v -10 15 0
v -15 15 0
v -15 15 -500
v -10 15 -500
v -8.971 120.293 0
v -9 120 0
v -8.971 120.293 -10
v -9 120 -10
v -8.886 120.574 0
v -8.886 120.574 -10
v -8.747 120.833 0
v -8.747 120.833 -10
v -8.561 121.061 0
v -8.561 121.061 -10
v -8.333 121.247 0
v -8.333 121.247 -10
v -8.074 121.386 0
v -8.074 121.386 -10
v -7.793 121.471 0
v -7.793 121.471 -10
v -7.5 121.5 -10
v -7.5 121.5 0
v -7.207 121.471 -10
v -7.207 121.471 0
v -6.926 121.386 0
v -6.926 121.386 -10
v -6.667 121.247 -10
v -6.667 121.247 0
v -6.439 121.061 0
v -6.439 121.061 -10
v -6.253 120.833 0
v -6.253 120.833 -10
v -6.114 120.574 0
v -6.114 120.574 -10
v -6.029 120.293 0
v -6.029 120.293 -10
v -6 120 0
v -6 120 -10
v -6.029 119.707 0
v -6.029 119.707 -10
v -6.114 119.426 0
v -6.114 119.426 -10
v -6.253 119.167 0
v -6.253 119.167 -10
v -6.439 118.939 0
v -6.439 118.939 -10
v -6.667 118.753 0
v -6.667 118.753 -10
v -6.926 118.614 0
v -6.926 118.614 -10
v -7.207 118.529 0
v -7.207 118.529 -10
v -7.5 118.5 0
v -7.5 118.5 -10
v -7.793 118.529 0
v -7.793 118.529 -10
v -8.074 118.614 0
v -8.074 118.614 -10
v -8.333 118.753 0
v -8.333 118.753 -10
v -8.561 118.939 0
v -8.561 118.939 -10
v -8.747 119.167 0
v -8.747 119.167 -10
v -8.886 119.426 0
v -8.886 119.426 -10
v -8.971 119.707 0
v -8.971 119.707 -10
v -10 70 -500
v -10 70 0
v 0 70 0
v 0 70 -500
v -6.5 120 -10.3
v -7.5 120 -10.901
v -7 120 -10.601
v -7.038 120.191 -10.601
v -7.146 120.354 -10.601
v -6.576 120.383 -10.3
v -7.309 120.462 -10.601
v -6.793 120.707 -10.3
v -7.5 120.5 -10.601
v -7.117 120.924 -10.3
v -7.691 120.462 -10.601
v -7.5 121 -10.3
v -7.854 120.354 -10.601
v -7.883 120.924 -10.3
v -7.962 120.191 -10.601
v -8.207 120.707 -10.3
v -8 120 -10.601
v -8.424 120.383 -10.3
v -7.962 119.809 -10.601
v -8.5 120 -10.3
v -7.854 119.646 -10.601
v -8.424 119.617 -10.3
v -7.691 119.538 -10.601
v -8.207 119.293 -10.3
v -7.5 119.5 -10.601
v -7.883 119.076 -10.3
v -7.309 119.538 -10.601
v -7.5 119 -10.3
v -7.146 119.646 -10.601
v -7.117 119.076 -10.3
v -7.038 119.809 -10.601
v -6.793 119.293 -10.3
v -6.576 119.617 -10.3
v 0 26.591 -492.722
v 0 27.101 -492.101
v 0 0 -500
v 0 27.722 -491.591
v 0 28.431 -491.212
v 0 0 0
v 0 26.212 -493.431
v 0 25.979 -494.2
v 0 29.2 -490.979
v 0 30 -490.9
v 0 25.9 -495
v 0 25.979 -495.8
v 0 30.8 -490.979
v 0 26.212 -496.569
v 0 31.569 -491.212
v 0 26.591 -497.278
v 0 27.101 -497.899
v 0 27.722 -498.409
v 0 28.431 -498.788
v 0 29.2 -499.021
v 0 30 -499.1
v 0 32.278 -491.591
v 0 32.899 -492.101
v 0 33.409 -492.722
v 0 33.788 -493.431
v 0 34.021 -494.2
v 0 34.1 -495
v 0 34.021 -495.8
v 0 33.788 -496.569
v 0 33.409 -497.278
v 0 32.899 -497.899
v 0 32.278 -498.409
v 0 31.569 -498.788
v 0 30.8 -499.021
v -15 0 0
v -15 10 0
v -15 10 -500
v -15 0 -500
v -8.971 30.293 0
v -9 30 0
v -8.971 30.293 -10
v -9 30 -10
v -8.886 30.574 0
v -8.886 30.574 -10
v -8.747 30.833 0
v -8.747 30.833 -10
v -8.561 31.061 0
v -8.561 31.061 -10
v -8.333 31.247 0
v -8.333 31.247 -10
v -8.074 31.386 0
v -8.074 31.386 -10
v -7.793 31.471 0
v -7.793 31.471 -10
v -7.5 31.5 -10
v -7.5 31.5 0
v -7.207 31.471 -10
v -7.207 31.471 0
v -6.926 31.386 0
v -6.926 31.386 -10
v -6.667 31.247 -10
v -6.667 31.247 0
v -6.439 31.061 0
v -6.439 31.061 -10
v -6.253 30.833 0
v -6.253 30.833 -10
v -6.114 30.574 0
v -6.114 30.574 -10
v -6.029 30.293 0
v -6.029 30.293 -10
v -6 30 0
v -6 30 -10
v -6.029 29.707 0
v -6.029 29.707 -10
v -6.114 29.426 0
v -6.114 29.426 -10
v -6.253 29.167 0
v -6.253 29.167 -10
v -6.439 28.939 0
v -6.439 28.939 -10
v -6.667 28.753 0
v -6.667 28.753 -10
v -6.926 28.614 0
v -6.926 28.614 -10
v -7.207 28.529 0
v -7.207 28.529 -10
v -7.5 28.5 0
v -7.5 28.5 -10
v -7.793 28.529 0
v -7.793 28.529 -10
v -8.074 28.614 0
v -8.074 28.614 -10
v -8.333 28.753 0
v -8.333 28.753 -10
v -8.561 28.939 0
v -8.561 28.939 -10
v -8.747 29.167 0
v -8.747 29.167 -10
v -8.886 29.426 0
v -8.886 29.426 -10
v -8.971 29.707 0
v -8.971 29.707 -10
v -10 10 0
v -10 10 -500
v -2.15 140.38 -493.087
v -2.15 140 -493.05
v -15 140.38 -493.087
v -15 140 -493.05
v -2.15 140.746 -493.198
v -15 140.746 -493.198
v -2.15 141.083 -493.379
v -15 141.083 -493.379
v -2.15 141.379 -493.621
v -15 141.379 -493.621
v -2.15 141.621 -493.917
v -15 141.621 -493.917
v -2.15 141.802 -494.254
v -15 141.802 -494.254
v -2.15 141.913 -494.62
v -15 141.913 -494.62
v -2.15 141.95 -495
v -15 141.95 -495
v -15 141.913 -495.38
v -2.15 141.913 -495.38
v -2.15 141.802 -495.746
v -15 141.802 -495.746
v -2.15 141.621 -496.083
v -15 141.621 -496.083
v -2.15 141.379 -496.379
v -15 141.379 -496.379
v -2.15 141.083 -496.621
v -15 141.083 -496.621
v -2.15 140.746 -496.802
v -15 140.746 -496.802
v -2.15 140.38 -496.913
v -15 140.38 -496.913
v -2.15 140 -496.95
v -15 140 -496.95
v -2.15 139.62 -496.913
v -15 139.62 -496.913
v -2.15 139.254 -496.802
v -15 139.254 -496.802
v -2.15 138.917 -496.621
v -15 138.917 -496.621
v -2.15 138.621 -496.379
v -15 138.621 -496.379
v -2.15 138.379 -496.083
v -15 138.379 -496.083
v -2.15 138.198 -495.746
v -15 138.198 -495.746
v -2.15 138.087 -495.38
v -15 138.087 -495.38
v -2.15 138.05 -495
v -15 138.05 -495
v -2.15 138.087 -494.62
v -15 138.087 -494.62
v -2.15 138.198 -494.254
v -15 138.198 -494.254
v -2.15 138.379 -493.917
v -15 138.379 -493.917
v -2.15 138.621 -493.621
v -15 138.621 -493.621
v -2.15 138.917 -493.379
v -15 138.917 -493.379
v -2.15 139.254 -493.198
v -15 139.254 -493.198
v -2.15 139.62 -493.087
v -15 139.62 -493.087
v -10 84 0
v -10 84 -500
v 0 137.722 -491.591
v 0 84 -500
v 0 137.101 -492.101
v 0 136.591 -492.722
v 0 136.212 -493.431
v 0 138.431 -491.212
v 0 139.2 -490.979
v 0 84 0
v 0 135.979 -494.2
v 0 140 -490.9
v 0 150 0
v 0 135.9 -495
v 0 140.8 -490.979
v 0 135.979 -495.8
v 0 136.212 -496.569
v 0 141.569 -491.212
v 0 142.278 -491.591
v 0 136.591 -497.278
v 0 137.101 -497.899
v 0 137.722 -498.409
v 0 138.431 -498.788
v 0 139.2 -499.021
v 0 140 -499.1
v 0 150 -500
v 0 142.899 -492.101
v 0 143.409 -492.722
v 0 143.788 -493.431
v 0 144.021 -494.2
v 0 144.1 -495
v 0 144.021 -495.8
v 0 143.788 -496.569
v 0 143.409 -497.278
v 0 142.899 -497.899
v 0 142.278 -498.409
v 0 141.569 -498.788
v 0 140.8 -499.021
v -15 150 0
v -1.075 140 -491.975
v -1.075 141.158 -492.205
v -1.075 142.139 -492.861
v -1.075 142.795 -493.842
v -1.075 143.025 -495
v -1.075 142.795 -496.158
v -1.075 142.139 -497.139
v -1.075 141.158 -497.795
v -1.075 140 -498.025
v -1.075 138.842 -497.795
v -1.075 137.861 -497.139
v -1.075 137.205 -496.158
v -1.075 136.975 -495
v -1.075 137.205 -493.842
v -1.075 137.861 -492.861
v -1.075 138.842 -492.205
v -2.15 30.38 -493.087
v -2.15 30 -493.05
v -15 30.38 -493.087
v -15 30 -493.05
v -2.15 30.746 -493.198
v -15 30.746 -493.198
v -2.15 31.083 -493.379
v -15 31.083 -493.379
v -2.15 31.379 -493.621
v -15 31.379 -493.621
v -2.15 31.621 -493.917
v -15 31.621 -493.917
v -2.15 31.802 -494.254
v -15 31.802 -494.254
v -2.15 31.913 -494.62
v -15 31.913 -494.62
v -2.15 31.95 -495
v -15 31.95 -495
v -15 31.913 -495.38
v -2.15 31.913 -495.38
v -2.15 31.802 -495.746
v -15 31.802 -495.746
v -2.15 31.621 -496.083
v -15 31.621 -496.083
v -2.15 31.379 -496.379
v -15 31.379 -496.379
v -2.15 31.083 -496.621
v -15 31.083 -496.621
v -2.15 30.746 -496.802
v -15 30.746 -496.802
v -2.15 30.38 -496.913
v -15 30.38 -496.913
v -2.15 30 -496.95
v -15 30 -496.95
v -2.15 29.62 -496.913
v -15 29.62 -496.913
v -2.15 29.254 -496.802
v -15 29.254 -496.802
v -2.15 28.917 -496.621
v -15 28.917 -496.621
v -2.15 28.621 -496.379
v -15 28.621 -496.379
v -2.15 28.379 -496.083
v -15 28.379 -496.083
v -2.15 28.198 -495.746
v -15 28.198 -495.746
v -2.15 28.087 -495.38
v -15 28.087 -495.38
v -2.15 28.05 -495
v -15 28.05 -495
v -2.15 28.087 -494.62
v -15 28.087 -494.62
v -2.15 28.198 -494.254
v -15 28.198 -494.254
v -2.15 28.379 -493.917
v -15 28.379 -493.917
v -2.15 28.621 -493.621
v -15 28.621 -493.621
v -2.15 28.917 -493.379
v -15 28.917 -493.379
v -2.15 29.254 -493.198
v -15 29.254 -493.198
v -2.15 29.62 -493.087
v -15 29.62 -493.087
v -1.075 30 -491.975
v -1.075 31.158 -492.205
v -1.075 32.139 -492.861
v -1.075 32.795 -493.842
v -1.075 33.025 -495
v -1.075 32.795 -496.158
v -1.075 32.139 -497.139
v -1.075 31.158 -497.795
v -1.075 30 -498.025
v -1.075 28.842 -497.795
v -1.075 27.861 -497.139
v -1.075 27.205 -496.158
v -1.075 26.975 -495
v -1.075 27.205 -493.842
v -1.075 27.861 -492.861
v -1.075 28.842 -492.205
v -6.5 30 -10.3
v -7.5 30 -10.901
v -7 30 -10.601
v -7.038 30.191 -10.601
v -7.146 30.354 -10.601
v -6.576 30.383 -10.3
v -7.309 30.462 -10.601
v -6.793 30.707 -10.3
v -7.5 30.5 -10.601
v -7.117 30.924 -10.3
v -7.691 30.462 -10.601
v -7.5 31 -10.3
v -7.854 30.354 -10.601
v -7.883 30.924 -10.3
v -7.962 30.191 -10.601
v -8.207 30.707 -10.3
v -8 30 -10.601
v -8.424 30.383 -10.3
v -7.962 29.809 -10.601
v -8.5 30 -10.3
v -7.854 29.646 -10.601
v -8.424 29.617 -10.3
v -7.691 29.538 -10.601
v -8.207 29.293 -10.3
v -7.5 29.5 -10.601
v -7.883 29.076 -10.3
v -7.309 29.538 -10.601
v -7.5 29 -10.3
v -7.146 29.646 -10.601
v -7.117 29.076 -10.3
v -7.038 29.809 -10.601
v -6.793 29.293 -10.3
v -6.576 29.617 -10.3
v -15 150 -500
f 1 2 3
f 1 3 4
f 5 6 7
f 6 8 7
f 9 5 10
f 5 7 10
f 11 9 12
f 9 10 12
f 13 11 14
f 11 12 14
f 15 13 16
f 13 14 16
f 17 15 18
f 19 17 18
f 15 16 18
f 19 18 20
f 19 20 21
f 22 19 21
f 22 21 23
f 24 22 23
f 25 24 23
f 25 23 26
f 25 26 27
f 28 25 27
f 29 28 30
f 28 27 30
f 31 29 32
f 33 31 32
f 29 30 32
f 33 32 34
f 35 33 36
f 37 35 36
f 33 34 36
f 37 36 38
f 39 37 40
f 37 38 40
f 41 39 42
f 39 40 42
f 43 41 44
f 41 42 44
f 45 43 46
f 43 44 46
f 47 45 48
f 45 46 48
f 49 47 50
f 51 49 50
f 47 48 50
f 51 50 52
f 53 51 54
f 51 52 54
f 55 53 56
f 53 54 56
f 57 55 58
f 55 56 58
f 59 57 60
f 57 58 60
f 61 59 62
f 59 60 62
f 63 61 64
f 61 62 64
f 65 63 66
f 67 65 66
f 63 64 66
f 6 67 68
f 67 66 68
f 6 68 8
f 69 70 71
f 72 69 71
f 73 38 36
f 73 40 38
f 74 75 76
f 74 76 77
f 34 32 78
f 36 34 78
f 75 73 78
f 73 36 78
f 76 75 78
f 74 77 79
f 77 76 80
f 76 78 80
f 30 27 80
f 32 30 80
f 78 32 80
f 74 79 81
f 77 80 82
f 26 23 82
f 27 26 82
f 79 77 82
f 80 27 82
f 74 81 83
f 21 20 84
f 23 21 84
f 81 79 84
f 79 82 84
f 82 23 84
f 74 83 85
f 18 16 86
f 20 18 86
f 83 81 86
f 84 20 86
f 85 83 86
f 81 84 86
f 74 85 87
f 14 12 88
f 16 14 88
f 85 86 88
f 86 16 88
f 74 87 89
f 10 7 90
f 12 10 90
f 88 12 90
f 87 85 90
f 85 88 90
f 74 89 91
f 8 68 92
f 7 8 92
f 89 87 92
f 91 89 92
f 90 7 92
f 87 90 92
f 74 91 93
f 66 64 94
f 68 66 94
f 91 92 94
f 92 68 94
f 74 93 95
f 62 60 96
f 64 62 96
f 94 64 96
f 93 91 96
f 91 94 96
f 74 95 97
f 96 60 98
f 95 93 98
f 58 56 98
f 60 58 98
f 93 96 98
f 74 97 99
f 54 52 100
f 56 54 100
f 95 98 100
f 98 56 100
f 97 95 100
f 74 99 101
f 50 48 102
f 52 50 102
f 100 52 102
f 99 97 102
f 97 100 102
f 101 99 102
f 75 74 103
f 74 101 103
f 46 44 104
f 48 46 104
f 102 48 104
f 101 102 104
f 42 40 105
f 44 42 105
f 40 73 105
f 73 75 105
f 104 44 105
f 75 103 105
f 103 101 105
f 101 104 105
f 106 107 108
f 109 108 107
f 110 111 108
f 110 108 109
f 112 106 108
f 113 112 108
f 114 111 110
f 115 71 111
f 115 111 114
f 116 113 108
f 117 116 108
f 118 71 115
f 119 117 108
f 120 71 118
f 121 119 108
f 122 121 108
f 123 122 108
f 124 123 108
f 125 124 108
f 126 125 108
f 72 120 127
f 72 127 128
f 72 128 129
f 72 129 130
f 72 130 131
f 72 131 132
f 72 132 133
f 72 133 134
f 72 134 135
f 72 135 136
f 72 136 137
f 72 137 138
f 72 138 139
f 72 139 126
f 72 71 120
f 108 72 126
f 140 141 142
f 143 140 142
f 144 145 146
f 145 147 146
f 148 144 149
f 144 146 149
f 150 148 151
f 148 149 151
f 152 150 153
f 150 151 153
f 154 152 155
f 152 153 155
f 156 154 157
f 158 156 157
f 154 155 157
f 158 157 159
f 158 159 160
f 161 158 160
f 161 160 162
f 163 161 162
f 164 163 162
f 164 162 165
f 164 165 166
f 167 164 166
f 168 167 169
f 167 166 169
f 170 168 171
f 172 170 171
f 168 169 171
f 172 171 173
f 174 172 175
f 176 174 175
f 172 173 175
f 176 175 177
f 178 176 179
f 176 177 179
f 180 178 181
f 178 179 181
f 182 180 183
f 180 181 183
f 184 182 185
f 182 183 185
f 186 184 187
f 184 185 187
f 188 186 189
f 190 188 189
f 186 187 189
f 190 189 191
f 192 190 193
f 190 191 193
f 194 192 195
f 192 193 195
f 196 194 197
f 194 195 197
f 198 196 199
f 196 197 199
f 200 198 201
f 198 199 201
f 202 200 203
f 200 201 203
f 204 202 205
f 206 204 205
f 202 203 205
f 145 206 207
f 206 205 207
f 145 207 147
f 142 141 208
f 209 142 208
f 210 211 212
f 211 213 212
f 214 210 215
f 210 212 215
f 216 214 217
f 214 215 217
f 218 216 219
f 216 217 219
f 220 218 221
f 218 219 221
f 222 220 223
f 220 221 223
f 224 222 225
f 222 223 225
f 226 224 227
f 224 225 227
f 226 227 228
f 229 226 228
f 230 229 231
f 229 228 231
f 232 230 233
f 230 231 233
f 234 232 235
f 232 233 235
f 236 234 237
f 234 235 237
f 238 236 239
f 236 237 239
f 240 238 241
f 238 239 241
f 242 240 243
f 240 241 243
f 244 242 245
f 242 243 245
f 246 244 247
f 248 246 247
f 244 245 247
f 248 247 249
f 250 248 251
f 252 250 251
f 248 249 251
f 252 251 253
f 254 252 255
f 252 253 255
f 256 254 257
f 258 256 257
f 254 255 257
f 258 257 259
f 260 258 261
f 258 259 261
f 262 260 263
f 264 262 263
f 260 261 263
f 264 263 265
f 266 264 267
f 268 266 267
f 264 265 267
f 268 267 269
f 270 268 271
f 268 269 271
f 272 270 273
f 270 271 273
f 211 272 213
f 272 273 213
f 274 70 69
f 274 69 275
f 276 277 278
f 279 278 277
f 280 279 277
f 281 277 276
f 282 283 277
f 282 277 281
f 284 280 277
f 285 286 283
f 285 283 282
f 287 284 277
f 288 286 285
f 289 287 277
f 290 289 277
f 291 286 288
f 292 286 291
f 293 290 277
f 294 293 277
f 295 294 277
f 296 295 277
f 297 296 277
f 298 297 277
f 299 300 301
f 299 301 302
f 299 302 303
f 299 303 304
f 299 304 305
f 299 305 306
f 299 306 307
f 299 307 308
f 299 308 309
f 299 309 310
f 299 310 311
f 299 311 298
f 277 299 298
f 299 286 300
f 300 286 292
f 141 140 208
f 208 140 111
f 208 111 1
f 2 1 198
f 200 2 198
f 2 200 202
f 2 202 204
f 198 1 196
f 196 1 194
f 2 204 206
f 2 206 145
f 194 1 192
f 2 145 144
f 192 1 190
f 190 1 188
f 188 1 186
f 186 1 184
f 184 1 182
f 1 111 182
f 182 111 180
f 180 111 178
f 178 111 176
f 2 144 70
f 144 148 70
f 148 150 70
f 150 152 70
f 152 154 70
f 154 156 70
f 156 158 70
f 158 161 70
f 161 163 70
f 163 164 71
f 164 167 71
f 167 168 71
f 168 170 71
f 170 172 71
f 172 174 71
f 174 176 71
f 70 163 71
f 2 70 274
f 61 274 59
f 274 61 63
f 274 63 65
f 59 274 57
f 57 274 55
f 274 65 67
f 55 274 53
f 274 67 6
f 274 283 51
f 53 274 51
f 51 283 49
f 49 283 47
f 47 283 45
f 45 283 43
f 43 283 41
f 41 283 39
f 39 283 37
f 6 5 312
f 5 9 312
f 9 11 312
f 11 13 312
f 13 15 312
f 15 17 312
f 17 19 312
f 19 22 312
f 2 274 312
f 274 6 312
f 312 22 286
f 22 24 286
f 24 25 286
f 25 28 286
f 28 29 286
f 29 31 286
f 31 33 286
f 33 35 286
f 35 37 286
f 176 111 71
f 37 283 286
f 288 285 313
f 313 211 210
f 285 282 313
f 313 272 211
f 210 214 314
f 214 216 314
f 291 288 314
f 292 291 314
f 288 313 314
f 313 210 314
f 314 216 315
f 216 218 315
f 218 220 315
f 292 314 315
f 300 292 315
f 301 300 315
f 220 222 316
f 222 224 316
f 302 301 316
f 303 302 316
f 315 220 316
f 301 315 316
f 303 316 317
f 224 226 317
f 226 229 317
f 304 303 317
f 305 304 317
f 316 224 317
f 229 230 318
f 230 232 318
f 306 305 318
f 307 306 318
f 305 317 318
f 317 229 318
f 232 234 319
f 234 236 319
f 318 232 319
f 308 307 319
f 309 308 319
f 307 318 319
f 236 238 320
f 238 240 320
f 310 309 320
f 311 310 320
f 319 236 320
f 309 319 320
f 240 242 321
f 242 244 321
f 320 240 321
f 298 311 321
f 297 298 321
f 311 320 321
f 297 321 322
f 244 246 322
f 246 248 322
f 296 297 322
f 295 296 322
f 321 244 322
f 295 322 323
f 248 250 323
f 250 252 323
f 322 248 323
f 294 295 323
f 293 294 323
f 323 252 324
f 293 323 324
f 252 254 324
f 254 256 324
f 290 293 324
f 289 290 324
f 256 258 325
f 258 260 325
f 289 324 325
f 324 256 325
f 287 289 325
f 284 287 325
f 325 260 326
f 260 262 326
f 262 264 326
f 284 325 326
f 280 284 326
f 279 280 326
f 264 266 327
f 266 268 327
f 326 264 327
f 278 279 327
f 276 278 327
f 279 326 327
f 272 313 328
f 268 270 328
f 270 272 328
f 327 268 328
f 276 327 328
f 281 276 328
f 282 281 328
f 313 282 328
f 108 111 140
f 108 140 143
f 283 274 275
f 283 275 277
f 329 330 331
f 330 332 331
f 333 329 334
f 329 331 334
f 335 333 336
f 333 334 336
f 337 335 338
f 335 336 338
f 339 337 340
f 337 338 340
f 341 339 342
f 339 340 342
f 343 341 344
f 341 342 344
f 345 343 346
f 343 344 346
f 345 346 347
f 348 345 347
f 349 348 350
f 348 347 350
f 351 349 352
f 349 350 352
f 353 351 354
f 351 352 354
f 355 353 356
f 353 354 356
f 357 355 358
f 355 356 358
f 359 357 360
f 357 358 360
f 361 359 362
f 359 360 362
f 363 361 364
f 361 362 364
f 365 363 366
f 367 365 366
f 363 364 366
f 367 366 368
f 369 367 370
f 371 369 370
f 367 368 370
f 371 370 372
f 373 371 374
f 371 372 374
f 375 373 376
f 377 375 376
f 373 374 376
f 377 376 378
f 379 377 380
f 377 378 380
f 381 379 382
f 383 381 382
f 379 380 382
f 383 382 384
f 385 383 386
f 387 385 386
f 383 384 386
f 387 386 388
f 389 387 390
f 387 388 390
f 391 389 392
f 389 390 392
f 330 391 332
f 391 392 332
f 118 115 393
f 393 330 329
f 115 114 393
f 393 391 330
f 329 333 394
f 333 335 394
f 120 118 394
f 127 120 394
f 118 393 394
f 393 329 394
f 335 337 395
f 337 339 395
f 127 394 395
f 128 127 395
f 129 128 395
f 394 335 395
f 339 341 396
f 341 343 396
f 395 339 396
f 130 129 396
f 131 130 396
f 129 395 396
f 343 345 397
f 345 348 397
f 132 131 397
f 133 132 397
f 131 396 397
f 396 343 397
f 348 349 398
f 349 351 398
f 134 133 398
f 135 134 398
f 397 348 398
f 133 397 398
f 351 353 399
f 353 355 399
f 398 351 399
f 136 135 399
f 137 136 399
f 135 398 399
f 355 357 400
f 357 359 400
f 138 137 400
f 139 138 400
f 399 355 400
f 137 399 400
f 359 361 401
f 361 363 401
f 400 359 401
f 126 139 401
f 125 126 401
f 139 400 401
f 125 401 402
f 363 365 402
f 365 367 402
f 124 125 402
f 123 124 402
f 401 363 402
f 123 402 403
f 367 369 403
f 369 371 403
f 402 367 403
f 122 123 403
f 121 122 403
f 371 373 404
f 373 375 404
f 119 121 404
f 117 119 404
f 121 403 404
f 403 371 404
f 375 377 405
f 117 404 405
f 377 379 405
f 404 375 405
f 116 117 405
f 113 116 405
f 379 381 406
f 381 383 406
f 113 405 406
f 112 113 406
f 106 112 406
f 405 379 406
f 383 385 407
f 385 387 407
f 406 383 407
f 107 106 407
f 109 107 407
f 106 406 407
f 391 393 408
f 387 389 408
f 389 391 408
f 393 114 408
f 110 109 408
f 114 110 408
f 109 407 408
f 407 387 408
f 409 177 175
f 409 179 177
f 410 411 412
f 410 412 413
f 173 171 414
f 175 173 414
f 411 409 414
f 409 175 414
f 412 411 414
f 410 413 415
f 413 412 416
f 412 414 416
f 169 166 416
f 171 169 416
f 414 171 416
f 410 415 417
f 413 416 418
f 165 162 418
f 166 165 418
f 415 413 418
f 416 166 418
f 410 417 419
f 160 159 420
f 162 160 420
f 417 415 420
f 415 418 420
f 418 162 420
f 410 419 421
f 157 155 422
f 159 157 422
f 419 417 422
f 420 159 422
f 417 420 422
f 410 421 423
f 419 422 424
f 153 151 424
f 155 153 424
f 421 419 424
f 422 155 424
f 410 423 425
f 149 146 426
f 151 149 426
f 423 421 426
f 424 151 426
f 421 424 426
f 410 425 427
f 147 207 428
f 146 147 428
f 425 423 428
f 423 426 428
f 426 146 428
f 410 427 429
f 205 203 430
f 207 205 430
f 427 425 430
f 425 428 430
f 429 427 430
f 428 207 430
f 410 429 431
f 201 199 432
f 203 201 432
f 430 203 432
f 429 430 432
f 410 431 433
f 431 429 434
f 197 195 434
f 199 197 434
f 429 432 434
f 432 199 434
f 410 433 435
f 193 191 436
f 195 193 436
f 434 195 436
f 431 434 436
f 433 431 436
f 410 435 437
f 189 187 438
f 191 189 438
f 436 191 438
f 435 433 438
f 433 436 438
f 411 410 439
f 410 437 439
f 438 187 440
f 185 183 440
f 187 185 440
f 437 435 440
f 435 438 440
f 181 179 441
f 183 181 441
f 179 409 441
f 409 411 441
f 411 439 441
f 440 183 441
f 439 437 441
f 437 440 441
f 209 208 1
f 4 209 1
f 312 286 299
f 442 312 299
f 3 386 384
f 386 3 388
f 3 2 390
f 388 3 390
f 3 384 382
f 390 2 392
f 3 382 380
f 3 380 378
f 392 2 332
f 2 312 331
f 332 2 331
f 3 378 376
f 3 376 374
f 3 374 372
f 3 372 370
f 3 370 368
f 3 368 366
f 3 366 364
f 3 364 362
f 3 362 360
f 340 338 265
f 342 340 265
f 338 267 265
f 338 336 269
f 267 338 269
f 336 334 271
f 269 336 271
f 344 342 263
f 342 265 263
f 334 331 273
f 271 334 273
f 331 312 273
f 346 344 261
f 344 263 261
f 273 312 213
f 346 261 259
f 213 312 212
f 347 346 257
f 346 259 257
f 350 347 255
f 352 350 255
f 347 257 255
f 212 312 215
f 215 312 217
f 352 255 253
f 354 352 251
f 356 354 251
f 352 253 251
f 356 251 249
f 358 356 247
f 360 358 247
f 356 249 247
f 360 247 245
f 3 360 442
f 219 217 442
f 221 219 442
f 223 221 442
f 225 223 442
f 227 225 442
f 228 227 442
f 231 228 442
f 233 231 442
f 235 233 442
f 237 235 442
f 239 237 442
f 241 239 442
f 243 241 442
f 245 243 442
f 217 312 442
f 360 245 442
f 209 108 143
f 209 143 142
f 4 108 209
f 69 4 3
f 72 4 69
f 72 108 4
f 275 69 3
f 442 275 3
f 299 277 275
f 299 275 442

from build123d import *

# Parameters (mm, degrees)
SKETCH2_W                                         = 500
SKETCH2_H                                         = 150
BASE_EXTRUDE_DEPTH                                = 15
SKETCH3_W                                         = 10
SKETCH3_H                                         = 14
CUT_EXTRUDE1_DEPTH                                = 523.230791892
SKETCH4_W                                         = 5
SKETCH4_H                                         = 5
CUT_EXTRUDE2_DEPTH                                = 523.230791892
CSK_FOR_M3_5_FLAT_HEAD_MACHINE_SCREW1_D           = 3.9
CSK_FOR_M3_5_FLAT_HEAD_MACHINE_SCREW1_CSINK_D     = 8.2
CSK_FOR_M3_5_FLAT_HEAD_MACHINE_SCREW1_CSINK_ANGLE = 90
M3_0_3_000000_DIAMETER_HOLE1_D                    = 3
M3_0_3_000000_DIAMETER_HOLE1_DEPTH                = 10
M3_0_3_000000_DIAMETER_HOLE1_TIP                  = 0.901290929


with BuildPart() as part:
    # Sketch2 → Base-Extrude (new body)
    with BuildSketch(Plane(origin=(0, 0, 0), x_dir=(0, 0, -1), z_dir=(1, 0, 0))):
        with Locations((250, 75)):
            Rectangle(SKETCH2_W, SKETCH2_H)
    extrude(amount=-BASE_EXTRUDE_DEPTH)

    # Sketch3 → Cut-Extrude1 (cut, through all)
    with BuildSketch(Plane.XY):
        with Locations((-5, 77)):
            Rectangle(SKETCH3_W, SKETCH3_H)
    extrude(amount=-CUT_EXTRUDE1_DEPTH, mode=Mode.SUBTRACT)

    # Sketch4 → Cut-Extrude2 (cut, through all)
    with BuildSketch(Plane.XY):
        with Locations((-12.5, 12.5)):
            Rectangle(SKETCH4_W, SKETCH4_H)
    extrude(amount=-CUT_EXTRUDE2_DEPTH, mode=Mode.SUBTRACT)

    # CSK for M3.5 Flat Head Machine Screw1 (through all)
    with Locations(Plane(origin=(0, 0, 0), x_dir=(0, 0, -1), z_dir=(1, 0, 0))):
        with Locations((495, 140), (495, 30)):
            CounterSinkHole(CSK_FOR_M3_5_FLAT_HEAD_MACHINE_SCREW1_D / 2, CSK_FOR_M3_5_FLAT_HEAD_MACHINE_SCREW1_CSINK_D / 2, counter_sink_angle=CSK_FOR_M3_5_FLAT_HEAD_MACHINE_SCREW1_CSINK_ANGLE)

    # M3.0 (3.000000) Diameter Hole1
    with Locations(Plane.XY):
        with Locations((-7.5, 30), (-7.5, 120)):
            Hole(M3_0_3_000000_DIAMETER_HOLE1_D / 2, depth=M3_0_3_000000_DIAMETER_HOLE1_DEPTH)
            with Locations((0, 0, -(M3_0_3_000000_DIAMETER_HOLE1_DEPTH + M3_0_3_000000_DIAMETER_HOLE1_TIP / 2))):  # 118° drill point
                Cone(0, M3_0_3_000000_DIAMETER_HOLE1_D / 2, M3_0_3_000000_DIAMETER_HOLE1_TIP, mode=Mode.SUBTRACT)


solid = part.part
